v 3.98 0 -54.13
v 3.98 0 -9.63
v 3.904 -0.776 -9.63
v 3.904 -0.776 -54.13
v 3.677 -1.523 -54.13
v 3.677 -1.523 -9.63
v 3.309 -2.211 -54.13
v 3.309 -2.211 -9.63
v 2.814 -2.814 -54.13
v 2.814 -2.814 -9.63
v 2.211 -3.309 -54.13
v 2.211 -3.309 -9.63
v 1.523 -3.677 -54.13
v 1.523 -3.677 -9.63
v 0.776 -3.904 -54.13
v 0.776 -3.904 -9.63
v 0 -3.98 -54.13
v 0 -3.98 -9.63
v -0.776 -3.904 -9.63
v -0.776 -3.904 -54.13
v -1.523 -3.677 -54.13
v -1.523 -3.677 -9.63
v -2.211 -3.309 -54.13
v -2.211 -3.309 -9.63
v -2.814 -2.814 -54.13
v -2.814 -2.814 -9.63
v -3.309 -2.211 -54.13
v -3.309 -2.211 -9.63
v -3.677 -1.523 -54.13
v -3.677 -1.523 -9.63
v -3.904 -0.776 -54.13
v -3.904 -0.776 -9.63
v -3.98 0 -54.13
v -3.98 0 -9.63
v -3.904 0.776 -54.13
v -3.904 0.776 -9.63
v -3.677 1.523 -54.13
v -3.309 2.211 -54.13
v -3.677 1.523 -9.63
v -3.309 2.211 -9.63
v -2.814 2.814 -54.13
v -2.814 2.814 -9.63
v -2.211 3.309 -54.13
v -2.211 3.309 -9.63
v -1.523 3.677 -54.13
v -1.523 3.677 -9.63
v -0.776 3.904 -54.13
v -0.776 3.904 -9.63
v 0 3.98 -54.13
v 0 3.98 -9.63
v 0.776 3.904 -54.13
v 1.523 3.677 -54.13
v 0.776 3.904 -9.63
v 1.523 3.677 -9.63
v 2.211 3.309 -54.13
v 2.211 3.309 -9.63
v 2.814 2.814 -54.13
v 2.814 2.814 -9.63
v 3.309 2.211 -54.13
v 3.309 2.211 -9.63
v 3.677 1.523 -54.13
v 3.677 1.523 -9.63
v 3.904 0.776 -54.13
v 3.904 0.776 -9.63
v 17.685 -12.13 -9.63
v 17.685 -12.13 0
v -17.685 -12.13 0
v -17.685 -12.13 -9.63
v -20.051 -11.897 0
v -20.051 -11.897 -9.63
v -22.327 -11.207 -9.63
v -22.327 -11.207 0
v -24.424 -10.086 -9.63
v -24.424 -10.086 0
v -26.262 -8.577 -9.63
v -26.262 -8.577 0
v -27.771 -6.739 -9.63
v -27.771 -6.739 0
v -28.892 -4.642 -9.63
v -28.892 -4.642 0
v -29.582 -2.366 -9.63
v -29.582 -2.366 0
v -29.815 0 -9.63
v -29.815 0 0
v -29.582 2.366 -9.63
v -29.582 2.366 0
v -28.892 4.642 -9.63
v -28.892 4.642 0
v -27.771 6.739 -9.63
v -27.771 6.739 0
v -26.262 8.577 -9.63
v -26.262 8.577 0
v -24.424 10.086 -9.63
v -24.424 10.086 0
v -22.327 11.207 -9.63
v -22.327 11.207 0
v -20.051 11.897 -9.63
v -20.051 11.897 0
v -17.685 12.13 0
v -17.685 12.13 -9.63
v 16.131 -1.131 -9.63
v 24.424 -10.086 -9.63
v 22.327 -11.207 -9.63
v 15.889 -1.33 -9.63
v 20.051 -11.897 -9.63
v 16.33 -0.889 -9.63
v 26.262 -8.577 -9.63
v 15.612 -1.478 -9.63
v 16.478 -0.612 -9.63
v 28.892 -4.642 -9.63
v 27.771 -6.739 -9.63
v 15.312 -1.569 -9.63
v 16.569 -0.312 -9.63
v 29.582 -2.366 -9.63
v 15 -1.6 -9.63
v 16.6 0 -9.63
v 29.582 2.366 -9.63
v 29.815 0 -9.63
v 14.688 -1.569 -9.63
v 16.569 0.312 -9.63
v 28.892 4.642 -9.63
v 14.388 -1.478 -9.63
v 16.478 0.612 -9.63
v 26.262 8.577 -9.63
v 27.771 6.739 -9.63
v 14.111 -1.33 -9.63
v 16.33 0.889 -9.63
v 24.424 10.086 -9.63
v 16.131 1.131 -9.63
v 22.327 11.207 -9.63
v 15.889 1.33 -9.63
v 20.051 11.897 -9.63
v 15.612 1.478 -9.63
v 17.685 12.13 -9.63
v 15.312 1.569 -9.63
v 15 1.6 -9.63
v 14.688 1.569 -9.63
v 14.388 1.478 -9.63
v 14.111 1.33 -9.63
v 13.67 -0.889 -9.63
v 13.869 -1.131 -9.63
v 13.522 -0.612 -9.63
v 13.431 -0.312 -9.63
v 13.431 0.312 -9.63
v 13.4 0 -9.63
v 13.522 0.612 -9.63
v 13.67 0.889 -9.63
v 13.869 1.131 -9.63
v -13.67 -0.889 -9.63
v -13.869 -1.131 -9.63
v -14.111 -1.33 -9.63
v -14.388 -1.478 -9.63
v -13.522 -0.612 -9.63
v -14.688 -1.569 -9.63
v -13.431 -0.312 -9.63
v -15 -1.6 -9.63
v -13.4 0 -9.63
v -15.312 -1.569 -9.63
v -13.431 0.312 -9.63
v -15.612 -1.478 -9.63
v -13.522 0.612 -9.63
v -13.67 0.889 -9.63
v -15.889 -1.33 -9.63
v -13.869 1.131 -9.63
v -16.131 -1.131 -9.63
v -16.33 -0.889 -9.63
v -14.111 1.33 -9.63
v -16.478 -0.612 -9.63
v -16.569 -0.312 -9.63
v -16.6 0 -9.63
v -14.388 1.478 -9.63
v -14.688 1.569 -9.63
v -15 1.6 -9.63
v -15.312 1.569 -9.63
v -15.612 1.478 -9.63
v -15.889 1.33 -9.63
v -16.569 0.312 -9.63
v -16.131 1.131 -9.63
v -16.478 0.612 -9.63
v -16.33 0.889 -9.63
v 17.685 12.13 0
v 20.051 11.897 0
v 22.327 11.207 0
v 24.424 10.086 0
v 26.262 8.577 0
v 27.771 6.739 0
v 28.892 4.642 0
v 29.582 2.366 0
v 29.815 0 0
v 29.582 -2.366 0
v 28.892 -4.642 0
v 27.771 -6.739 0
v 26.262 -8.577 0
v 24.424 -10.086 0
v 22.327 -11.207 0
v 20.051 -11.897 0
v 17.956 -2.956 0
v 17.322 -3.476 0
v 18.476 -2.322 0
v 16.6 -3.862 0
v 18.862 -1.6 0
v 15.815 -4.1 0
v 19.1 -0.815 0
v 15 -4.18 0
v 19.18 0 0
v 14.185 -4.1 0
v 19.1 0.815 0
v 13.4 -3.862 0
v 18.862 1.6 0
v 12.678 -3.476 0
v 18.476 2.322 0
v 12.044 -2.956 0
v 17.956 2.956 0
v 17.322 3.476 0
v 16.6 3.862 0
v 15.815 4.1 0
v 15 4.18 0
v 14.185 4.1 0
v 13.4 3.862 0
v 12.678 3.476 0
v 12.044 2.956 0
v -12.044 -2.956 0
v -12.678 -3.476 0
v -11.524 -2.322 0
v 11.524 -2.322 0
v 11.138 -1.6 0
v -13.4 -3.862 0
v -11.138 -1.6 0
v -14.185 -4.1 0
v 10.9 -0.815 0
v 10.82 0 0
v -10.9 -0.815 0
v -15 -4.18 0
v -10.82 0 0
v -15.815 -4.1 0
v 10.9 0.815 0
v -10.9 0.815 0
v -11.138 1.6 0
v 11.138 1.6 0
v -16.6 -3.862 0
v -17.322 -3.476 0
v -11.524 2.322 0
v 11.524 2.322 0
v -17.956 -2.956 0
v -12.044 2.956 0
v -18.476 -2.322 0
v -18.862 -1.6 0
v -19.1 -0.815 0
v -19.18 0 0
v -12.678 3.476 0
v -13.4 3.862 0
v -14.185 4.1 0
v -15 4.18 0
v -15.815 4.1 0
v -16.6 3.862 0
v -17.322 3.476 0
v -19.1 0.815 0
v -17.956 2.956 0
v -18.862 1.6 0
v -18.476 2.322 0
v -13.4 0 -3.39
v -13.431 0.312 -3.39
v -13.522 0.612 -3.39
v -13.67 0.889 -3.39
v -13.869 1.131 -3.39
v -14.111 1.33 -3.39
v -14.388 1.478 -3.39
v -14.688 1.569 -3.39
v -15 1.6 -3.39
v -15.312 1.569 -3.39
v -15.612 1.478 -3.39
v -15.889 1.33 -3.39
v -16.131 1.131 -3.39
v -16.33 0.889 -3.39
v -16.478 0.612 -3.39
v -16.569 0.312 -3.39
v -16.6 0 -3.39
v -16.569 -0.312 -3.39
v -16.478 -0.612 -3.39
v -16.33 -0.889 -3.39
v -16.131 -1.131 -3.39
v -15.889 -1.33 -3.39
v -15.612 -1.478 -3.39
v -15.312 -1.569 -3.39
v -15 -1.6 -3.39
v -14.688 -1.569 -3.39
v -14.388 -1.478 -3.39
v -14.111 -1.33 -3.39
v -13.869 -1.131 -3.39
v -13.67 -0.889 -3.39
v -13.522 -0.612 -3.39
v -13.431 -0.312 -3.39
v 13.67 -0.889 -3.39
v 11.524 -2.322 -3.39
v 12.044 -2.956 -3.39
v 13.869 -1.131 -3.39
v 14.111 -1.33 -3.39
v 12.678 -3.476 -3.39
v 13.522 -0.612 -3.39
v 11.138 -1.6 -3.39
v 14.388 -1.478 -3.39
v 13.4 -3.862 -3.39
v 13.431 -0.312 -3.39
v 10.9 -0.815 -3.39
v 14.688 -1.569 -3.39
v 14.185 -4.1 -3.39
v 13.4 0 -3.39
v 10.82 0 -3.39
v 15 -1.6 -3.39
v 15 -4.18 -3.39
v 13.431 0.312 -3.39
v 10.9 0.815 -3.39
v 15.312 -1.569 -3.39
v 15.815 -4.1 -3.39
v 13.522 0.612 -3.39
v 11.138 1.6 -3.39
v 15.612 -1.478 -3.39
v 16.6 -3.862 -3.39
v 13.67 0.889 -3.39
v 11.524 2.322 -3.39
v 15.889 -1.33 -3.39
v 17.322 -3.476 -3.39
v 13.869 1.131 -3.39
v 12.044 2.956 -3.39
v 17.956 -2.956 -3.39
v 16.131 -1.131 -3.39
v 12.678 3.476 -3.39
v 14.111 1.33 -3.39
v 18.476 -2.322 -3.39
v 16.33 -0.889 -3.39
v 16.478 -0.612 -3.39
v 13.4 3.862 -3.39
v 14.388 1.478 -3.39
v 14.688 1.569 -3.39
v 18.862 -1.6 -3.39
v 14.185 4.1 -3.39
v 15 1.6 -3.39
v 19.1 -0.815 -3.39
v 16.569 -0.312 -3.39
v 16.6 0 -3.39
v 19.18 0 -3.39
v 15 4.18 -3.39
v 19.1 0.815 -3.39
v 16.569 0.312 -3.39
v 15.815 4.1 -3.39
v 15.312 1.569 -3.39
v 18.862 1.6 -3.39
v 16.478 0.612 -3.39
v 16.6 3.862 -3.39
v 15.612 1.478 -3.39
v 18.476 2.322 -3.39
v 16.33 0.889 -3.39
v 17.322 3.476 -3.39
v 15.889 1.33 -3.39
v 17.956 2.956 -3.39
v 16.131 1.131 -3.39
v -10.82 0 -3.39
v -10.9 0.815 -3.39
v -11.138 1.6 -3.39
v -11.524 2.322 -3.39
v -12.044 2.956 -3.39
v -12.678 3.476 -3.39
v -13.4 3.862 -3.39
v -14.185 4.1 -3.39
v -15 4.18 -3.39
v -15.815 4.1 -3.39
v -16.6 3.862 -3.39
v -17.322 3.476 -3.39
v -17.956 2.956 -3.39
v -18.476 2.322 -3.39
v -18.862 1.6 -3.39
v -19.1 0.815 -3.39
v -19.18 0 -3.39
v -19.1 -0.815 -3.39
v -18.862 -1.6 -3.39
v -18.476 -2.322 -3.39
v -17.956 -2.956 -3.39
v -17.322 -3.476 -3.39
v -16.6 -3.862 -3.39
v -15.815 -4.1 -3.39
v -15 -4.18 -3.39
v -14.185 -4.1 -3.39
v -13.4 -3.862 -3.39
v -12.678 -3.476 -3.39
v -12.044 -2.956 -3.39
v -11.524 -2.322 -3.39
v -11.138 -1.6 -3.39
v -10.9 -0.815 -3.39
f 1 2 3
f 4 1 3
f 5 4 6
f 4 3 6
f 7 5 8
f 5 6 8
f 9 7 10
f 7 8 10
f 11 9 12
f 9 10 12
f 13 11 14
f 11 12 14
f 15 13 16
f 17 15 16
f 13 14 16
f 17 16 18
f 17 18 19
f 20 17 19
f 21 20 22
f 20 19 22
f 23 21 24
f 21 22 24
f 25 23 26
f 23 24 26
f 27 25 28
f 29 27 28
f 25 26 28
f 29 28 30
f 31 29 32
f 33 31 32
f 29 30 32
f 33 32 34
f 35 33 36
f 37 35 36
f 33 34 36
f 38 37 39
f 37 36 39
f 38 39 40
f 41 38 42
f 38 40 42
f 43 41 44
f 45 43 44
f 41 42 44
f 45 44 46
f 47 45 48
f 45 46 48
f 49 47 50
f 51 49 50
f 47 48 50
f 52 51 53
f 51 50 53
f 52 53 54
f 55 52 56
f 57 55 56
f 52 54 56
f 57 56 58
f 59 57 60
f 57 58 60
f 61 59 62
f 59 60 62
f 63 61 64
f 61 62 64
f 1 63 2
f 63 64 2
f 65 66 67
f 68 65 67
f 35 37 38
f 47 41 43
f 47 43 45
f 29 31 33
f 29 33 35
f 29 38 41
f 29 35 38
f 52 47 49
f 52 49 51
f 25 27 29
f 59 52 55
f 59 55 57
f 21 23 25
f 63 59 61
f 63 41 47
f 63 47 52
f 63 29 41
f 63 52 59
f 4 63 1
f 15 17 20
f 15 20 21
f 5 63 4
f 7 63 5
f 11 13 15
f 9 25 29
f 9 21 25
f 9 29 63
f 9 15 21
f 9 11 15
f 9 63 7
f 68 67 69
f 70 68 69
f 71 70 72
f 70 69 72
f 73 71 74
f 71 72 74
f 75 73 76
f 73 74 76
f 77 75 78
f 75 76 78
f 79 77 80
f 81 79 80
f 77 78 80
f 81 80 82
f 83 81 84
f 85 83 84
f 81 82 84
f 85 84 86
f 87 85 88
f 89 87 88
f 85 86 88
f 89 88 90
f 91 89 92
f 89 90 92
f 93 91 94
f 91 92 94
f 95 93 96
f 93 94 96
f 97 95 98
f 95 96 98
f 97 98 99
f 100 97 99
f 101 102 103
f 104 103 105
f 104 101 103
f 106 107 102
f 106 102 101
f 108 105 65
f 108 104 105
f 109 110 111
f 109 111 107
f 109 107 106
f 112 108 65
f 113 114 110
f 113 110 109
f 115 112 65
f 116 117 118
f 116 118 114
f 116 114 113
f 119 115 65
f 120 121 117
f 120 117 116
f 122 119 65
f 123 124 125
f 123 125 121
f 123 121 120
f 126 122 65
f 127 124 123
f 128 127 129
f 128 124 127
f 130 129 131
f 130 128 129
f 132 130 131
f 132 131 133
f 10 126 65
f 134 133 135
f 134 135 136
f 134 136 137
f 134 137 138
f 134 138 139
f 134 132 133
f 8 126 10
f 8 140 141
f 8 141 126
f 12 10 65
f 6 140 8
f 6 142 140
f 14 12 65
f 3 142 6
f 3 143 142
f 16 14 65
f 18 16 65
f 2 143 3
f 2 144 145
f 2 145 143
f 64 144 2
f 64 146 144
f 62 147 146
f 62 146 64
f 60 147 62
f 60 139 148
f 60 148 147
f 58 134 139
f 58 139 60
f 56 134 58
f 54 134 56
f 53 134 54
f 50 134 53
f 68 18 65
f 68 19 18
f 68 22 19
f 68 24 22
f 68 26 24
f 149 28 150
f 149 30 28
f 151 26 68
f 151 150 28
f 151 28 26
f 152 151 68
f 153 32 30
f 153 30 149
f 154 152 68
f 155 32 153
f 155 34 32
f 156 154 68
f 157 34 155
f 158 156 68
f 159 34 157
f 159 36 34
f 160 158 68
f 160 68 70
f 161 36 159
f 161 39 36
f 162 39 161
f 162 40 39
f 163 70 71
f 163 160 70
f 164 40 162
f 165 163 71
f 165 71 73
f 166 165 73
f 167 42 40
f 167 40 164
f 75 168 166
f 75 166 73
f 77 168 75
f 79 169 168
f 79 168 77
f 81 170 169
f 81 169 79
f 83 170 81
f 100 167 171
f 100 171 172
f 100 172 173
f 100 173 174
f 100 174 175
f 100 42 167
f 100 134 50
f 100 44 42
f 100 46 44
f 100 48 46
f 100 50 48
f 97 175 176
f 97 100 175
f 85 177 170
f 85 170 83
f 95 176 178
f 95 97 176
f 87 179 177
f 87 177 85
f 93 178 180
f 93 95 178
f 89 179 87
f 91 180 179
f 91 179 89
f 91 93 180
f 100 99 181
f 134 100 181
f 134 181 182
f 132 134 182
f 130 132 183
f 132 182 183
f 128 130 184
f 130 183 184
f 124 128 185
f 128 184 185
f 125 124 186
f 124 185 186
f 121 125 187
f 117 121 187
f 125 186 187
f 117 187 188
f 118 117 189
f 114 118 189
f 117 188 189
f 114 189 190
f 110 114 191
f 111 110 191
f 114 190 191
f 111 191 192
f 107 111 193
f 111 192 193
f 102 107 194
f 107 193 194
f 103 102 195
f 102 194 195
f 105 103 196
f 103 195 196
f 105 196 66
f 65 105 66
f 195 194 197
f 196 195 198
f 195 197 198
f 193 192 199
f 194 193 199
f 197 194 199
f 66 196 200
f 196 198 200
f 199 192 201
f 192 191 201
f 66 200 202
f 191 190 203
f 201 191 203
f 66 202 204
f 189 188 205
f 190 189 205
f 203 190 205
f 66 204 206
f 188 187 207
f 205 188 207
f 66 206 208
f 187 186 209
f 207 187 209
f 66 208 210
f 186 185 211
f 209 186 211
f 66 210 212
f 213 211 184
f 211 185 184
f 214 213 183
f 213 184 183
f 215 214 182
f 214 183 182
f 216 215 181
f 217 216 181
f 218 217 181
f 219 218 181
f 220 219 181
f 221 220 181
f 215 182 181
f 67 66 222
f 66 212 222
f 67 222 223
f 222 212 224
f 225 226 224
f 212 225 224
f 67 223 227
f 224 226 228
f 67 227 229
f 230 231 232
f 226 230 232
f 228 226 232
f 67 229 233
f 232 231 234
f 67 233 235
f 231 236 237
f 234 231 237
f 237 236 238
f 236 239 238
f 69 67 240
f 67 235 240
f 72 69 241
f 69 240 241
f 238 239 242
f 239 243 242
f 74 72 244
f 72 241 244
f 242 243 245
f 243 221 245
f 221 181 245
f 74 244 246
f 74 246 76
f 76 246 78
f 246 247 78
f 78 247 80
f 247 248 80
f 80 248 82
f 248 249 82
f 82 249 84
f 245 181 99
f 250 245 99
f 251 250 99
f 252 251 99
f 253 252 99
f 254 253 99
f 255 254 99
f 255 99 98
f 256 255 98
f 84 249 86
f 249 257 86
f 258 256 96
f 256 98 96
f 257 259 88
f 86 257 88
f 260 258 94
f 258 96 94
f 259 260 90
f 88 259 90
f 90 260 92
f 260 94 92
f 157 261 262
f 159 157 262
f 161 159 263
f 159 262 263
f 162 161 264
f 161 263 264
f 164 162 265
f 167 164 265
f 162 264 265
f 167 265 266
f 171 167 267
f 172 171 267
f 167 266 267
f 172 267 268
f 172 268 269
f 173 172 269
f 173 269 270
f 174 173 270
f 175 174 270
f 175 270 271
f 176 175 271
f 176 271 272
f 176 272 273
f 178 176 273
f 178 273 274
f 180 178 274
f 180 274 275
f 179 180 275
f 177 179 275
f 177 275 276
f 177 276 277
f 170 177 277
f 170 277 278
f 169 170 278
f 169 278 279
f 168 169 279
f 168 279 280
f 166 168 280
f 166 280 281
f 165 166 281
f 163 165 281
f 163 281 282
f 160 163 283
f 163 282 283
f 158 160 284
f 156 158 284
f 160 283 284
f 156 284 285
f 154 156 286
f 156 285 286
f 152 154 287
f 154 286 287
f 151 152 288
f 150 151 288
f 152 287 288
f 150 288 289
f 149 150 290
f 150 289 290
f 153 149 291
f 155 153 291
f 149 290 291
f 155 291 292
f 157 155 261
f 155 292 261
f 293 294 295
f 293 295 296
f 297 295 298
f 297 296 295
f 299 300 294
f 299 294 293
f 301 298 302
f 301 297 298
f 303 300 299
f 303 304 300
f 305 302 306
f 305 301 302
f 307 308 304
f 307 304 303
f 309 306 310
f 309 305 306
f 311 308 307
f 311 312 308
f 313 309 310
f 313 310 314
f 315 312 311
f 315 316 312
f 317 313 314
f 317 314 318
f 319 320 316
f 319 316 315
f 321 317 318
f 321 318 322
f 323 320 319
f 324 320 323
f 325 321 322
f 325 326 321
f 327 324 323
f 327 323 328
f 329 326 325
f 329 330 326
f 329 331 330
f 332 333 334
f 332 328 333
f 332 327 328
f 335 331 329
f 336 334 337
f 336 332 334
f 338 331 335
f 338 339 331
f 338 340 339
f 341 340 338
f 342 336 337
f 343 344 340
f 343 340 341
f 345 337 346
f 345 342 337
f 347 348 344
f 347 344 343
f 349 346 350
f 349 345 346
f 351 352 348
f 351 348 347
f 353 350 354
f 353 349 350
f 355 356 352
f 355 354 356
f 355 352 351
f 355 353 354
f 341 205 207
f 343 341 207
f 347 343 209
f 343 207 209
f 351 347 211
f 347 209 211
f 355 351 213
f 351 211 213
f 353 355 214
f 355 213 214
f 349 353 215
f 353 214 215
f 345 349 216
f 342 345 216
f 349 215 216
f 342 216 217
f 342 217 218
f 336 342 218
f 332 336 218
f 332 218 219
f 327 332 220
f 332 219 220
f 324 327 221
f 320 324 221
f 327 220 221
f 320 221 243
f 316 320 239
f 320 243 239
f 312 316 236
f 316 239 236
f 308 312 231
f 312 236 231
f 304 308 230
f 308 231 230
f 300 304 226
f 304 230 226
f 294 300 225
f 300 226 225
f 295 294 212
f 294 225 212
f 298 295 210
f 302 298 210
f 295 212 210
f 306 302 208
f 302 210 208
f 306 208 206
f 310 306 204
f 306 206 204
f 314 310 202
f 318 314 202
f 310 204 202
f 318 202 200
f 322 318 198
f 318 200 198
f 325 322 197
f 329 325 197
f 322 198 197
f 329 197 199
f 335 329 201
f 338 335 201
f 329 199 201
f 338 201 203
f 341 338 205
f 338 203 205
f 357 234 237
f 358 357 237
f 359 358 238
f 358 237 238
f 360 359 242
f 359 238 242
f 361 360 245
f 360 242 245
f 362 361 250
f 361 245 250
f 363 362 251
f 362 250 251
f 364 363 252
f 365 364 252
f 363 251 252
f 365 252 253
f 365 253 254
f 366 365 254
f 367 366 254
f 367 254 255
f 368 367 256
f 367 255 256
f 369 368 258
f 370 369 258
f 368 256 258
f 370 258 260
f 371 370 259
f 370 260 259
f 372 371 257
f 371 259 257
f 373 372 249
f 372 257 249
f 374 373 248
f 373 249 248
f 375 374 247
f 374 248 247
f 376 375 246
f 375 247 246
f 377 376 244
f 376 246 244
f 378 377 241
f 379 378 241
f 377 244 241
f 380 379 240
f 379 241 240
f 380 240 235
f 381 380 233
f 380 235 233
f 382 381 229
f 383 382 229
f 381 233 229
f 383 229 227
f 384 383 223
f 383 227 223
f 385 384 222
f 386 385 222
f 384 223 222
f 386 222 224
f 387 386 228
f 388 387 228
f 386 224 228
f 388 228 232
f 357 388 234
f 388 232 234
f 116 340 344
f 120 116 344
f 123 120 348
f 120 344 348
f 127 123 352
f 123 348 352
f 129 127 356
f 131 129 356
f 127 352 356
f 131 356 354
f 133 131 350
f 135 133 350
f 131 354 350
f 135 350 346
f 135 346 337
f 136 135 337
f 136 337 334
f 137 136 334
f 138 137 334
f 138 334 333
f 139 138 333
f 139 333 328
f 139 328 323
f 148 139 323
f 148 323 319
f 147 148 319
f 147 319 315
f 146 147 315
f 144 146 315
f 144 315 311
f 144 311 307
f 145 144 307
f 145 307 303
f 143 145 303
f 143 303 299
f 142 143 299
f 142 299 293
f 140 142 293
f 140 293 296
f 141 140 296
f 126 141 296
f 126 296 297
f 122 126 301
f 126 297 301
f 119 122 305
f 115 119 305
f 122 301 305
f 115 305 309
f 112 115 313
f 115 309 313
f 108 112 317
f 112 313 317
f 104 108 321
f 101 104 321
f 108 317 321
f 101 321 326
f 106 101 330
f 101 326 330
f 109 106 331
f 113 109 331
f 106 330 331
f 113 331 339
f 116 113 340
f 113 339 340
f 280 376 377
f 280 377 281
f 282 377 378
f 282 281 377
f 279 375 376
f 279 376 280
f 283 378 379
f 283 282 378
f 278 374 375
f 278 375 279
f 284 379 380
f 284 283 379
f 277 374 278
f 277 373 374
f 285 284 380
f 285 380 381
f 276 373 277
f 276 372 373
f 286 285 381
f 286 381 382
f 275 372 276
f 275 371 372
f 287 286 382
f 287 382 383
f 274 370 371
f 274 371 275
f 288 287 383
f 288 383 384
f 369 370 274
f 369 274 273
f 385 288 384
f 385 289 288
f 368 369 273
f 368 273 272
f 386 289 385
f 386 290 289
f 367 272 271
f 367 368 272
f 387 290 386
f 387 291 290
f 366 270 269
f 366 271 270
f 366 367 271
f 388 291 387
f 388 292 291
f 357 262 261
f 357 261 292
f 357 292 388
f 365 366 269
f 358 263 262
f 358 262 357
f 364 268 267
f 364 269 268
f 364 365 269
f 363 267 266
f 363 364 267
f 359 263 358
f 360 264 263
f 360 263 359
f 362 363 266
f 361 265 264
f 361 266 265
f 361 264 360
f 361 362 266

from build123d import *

# Parameters (mm, degrees)
SALIENTE_EXTRUIR1_DEPTH = 9.63
CROQUIS2_R              = 3.98
SALIENTE_EXTRUIR2_DEPTH = 44.5
CROQUIS3_R              = 1.6
CORTAR_EXTRUIR1_DEPTH   = 63.977202423
CROQUIS4_R              = 4.18
CORTAR_EXTRUIR2_DEPTH   = 3.39


with BuildPart() as part:
    # Croquis1 → Saliente-Extruir1 (new body)
    with BuildSketch(Plane.XY):
        with BuildLine():
            Line((-17.685, 12.13), (17.685, 12.13))
            ThreePointArc((17.685, 12.13), (29.815, 0), (17.685, -12.13))
            Line((17.685, -12.13), (-17.685, -12.13))
            ThreePointArc((-17.685, -12.13), (-29.815, 0), (-17.685, 12.13))
        make_face()
    extrude(amount=-SALIENTE_EXTRUIR1_DEPTH)

    # Croquis2 → Saliente-Extruir2 (add)
    with BuildSketch(Plane(origin=(0, 0, -9.63), x_dir=(-1, 0, 0), z_dir=(0, 0, -1))):
        with Locations(Location((0, 0, 0), (0, 0, 180))):
            Circle(CROQUIS2_R)
    extrude(amount=SALIENTE_EXTRUIR2_DEPTH)

    # Croquis3 → Cortar-Extruir1 (cut, through all)
    with BuildSketch(Plane.XY):
        with Locations((-15, 0)):
            Circle(CROQUIS3_R)
        with Locations((15, 0)):
            Circle(CROQUIS3_R)
    extrude(amount=-CORTAR_EXTRUIR1_DEPTH, mode=Mode.SUBTRACT)

    # Croquis4 → Cortar-Extruir2 (cut)
    with BuildSketch(Plane.XY):
        with Locations((-15, 0)):
            Circle(CROQUIS4_R)
        with Locations((15, 0)):
            Circle(CROQUIS4_R)
    extrude(amount=-CORTAR_EXTRUIR2_DEPTH, mode=Mode.SUBTRACT)


solid = part.part
